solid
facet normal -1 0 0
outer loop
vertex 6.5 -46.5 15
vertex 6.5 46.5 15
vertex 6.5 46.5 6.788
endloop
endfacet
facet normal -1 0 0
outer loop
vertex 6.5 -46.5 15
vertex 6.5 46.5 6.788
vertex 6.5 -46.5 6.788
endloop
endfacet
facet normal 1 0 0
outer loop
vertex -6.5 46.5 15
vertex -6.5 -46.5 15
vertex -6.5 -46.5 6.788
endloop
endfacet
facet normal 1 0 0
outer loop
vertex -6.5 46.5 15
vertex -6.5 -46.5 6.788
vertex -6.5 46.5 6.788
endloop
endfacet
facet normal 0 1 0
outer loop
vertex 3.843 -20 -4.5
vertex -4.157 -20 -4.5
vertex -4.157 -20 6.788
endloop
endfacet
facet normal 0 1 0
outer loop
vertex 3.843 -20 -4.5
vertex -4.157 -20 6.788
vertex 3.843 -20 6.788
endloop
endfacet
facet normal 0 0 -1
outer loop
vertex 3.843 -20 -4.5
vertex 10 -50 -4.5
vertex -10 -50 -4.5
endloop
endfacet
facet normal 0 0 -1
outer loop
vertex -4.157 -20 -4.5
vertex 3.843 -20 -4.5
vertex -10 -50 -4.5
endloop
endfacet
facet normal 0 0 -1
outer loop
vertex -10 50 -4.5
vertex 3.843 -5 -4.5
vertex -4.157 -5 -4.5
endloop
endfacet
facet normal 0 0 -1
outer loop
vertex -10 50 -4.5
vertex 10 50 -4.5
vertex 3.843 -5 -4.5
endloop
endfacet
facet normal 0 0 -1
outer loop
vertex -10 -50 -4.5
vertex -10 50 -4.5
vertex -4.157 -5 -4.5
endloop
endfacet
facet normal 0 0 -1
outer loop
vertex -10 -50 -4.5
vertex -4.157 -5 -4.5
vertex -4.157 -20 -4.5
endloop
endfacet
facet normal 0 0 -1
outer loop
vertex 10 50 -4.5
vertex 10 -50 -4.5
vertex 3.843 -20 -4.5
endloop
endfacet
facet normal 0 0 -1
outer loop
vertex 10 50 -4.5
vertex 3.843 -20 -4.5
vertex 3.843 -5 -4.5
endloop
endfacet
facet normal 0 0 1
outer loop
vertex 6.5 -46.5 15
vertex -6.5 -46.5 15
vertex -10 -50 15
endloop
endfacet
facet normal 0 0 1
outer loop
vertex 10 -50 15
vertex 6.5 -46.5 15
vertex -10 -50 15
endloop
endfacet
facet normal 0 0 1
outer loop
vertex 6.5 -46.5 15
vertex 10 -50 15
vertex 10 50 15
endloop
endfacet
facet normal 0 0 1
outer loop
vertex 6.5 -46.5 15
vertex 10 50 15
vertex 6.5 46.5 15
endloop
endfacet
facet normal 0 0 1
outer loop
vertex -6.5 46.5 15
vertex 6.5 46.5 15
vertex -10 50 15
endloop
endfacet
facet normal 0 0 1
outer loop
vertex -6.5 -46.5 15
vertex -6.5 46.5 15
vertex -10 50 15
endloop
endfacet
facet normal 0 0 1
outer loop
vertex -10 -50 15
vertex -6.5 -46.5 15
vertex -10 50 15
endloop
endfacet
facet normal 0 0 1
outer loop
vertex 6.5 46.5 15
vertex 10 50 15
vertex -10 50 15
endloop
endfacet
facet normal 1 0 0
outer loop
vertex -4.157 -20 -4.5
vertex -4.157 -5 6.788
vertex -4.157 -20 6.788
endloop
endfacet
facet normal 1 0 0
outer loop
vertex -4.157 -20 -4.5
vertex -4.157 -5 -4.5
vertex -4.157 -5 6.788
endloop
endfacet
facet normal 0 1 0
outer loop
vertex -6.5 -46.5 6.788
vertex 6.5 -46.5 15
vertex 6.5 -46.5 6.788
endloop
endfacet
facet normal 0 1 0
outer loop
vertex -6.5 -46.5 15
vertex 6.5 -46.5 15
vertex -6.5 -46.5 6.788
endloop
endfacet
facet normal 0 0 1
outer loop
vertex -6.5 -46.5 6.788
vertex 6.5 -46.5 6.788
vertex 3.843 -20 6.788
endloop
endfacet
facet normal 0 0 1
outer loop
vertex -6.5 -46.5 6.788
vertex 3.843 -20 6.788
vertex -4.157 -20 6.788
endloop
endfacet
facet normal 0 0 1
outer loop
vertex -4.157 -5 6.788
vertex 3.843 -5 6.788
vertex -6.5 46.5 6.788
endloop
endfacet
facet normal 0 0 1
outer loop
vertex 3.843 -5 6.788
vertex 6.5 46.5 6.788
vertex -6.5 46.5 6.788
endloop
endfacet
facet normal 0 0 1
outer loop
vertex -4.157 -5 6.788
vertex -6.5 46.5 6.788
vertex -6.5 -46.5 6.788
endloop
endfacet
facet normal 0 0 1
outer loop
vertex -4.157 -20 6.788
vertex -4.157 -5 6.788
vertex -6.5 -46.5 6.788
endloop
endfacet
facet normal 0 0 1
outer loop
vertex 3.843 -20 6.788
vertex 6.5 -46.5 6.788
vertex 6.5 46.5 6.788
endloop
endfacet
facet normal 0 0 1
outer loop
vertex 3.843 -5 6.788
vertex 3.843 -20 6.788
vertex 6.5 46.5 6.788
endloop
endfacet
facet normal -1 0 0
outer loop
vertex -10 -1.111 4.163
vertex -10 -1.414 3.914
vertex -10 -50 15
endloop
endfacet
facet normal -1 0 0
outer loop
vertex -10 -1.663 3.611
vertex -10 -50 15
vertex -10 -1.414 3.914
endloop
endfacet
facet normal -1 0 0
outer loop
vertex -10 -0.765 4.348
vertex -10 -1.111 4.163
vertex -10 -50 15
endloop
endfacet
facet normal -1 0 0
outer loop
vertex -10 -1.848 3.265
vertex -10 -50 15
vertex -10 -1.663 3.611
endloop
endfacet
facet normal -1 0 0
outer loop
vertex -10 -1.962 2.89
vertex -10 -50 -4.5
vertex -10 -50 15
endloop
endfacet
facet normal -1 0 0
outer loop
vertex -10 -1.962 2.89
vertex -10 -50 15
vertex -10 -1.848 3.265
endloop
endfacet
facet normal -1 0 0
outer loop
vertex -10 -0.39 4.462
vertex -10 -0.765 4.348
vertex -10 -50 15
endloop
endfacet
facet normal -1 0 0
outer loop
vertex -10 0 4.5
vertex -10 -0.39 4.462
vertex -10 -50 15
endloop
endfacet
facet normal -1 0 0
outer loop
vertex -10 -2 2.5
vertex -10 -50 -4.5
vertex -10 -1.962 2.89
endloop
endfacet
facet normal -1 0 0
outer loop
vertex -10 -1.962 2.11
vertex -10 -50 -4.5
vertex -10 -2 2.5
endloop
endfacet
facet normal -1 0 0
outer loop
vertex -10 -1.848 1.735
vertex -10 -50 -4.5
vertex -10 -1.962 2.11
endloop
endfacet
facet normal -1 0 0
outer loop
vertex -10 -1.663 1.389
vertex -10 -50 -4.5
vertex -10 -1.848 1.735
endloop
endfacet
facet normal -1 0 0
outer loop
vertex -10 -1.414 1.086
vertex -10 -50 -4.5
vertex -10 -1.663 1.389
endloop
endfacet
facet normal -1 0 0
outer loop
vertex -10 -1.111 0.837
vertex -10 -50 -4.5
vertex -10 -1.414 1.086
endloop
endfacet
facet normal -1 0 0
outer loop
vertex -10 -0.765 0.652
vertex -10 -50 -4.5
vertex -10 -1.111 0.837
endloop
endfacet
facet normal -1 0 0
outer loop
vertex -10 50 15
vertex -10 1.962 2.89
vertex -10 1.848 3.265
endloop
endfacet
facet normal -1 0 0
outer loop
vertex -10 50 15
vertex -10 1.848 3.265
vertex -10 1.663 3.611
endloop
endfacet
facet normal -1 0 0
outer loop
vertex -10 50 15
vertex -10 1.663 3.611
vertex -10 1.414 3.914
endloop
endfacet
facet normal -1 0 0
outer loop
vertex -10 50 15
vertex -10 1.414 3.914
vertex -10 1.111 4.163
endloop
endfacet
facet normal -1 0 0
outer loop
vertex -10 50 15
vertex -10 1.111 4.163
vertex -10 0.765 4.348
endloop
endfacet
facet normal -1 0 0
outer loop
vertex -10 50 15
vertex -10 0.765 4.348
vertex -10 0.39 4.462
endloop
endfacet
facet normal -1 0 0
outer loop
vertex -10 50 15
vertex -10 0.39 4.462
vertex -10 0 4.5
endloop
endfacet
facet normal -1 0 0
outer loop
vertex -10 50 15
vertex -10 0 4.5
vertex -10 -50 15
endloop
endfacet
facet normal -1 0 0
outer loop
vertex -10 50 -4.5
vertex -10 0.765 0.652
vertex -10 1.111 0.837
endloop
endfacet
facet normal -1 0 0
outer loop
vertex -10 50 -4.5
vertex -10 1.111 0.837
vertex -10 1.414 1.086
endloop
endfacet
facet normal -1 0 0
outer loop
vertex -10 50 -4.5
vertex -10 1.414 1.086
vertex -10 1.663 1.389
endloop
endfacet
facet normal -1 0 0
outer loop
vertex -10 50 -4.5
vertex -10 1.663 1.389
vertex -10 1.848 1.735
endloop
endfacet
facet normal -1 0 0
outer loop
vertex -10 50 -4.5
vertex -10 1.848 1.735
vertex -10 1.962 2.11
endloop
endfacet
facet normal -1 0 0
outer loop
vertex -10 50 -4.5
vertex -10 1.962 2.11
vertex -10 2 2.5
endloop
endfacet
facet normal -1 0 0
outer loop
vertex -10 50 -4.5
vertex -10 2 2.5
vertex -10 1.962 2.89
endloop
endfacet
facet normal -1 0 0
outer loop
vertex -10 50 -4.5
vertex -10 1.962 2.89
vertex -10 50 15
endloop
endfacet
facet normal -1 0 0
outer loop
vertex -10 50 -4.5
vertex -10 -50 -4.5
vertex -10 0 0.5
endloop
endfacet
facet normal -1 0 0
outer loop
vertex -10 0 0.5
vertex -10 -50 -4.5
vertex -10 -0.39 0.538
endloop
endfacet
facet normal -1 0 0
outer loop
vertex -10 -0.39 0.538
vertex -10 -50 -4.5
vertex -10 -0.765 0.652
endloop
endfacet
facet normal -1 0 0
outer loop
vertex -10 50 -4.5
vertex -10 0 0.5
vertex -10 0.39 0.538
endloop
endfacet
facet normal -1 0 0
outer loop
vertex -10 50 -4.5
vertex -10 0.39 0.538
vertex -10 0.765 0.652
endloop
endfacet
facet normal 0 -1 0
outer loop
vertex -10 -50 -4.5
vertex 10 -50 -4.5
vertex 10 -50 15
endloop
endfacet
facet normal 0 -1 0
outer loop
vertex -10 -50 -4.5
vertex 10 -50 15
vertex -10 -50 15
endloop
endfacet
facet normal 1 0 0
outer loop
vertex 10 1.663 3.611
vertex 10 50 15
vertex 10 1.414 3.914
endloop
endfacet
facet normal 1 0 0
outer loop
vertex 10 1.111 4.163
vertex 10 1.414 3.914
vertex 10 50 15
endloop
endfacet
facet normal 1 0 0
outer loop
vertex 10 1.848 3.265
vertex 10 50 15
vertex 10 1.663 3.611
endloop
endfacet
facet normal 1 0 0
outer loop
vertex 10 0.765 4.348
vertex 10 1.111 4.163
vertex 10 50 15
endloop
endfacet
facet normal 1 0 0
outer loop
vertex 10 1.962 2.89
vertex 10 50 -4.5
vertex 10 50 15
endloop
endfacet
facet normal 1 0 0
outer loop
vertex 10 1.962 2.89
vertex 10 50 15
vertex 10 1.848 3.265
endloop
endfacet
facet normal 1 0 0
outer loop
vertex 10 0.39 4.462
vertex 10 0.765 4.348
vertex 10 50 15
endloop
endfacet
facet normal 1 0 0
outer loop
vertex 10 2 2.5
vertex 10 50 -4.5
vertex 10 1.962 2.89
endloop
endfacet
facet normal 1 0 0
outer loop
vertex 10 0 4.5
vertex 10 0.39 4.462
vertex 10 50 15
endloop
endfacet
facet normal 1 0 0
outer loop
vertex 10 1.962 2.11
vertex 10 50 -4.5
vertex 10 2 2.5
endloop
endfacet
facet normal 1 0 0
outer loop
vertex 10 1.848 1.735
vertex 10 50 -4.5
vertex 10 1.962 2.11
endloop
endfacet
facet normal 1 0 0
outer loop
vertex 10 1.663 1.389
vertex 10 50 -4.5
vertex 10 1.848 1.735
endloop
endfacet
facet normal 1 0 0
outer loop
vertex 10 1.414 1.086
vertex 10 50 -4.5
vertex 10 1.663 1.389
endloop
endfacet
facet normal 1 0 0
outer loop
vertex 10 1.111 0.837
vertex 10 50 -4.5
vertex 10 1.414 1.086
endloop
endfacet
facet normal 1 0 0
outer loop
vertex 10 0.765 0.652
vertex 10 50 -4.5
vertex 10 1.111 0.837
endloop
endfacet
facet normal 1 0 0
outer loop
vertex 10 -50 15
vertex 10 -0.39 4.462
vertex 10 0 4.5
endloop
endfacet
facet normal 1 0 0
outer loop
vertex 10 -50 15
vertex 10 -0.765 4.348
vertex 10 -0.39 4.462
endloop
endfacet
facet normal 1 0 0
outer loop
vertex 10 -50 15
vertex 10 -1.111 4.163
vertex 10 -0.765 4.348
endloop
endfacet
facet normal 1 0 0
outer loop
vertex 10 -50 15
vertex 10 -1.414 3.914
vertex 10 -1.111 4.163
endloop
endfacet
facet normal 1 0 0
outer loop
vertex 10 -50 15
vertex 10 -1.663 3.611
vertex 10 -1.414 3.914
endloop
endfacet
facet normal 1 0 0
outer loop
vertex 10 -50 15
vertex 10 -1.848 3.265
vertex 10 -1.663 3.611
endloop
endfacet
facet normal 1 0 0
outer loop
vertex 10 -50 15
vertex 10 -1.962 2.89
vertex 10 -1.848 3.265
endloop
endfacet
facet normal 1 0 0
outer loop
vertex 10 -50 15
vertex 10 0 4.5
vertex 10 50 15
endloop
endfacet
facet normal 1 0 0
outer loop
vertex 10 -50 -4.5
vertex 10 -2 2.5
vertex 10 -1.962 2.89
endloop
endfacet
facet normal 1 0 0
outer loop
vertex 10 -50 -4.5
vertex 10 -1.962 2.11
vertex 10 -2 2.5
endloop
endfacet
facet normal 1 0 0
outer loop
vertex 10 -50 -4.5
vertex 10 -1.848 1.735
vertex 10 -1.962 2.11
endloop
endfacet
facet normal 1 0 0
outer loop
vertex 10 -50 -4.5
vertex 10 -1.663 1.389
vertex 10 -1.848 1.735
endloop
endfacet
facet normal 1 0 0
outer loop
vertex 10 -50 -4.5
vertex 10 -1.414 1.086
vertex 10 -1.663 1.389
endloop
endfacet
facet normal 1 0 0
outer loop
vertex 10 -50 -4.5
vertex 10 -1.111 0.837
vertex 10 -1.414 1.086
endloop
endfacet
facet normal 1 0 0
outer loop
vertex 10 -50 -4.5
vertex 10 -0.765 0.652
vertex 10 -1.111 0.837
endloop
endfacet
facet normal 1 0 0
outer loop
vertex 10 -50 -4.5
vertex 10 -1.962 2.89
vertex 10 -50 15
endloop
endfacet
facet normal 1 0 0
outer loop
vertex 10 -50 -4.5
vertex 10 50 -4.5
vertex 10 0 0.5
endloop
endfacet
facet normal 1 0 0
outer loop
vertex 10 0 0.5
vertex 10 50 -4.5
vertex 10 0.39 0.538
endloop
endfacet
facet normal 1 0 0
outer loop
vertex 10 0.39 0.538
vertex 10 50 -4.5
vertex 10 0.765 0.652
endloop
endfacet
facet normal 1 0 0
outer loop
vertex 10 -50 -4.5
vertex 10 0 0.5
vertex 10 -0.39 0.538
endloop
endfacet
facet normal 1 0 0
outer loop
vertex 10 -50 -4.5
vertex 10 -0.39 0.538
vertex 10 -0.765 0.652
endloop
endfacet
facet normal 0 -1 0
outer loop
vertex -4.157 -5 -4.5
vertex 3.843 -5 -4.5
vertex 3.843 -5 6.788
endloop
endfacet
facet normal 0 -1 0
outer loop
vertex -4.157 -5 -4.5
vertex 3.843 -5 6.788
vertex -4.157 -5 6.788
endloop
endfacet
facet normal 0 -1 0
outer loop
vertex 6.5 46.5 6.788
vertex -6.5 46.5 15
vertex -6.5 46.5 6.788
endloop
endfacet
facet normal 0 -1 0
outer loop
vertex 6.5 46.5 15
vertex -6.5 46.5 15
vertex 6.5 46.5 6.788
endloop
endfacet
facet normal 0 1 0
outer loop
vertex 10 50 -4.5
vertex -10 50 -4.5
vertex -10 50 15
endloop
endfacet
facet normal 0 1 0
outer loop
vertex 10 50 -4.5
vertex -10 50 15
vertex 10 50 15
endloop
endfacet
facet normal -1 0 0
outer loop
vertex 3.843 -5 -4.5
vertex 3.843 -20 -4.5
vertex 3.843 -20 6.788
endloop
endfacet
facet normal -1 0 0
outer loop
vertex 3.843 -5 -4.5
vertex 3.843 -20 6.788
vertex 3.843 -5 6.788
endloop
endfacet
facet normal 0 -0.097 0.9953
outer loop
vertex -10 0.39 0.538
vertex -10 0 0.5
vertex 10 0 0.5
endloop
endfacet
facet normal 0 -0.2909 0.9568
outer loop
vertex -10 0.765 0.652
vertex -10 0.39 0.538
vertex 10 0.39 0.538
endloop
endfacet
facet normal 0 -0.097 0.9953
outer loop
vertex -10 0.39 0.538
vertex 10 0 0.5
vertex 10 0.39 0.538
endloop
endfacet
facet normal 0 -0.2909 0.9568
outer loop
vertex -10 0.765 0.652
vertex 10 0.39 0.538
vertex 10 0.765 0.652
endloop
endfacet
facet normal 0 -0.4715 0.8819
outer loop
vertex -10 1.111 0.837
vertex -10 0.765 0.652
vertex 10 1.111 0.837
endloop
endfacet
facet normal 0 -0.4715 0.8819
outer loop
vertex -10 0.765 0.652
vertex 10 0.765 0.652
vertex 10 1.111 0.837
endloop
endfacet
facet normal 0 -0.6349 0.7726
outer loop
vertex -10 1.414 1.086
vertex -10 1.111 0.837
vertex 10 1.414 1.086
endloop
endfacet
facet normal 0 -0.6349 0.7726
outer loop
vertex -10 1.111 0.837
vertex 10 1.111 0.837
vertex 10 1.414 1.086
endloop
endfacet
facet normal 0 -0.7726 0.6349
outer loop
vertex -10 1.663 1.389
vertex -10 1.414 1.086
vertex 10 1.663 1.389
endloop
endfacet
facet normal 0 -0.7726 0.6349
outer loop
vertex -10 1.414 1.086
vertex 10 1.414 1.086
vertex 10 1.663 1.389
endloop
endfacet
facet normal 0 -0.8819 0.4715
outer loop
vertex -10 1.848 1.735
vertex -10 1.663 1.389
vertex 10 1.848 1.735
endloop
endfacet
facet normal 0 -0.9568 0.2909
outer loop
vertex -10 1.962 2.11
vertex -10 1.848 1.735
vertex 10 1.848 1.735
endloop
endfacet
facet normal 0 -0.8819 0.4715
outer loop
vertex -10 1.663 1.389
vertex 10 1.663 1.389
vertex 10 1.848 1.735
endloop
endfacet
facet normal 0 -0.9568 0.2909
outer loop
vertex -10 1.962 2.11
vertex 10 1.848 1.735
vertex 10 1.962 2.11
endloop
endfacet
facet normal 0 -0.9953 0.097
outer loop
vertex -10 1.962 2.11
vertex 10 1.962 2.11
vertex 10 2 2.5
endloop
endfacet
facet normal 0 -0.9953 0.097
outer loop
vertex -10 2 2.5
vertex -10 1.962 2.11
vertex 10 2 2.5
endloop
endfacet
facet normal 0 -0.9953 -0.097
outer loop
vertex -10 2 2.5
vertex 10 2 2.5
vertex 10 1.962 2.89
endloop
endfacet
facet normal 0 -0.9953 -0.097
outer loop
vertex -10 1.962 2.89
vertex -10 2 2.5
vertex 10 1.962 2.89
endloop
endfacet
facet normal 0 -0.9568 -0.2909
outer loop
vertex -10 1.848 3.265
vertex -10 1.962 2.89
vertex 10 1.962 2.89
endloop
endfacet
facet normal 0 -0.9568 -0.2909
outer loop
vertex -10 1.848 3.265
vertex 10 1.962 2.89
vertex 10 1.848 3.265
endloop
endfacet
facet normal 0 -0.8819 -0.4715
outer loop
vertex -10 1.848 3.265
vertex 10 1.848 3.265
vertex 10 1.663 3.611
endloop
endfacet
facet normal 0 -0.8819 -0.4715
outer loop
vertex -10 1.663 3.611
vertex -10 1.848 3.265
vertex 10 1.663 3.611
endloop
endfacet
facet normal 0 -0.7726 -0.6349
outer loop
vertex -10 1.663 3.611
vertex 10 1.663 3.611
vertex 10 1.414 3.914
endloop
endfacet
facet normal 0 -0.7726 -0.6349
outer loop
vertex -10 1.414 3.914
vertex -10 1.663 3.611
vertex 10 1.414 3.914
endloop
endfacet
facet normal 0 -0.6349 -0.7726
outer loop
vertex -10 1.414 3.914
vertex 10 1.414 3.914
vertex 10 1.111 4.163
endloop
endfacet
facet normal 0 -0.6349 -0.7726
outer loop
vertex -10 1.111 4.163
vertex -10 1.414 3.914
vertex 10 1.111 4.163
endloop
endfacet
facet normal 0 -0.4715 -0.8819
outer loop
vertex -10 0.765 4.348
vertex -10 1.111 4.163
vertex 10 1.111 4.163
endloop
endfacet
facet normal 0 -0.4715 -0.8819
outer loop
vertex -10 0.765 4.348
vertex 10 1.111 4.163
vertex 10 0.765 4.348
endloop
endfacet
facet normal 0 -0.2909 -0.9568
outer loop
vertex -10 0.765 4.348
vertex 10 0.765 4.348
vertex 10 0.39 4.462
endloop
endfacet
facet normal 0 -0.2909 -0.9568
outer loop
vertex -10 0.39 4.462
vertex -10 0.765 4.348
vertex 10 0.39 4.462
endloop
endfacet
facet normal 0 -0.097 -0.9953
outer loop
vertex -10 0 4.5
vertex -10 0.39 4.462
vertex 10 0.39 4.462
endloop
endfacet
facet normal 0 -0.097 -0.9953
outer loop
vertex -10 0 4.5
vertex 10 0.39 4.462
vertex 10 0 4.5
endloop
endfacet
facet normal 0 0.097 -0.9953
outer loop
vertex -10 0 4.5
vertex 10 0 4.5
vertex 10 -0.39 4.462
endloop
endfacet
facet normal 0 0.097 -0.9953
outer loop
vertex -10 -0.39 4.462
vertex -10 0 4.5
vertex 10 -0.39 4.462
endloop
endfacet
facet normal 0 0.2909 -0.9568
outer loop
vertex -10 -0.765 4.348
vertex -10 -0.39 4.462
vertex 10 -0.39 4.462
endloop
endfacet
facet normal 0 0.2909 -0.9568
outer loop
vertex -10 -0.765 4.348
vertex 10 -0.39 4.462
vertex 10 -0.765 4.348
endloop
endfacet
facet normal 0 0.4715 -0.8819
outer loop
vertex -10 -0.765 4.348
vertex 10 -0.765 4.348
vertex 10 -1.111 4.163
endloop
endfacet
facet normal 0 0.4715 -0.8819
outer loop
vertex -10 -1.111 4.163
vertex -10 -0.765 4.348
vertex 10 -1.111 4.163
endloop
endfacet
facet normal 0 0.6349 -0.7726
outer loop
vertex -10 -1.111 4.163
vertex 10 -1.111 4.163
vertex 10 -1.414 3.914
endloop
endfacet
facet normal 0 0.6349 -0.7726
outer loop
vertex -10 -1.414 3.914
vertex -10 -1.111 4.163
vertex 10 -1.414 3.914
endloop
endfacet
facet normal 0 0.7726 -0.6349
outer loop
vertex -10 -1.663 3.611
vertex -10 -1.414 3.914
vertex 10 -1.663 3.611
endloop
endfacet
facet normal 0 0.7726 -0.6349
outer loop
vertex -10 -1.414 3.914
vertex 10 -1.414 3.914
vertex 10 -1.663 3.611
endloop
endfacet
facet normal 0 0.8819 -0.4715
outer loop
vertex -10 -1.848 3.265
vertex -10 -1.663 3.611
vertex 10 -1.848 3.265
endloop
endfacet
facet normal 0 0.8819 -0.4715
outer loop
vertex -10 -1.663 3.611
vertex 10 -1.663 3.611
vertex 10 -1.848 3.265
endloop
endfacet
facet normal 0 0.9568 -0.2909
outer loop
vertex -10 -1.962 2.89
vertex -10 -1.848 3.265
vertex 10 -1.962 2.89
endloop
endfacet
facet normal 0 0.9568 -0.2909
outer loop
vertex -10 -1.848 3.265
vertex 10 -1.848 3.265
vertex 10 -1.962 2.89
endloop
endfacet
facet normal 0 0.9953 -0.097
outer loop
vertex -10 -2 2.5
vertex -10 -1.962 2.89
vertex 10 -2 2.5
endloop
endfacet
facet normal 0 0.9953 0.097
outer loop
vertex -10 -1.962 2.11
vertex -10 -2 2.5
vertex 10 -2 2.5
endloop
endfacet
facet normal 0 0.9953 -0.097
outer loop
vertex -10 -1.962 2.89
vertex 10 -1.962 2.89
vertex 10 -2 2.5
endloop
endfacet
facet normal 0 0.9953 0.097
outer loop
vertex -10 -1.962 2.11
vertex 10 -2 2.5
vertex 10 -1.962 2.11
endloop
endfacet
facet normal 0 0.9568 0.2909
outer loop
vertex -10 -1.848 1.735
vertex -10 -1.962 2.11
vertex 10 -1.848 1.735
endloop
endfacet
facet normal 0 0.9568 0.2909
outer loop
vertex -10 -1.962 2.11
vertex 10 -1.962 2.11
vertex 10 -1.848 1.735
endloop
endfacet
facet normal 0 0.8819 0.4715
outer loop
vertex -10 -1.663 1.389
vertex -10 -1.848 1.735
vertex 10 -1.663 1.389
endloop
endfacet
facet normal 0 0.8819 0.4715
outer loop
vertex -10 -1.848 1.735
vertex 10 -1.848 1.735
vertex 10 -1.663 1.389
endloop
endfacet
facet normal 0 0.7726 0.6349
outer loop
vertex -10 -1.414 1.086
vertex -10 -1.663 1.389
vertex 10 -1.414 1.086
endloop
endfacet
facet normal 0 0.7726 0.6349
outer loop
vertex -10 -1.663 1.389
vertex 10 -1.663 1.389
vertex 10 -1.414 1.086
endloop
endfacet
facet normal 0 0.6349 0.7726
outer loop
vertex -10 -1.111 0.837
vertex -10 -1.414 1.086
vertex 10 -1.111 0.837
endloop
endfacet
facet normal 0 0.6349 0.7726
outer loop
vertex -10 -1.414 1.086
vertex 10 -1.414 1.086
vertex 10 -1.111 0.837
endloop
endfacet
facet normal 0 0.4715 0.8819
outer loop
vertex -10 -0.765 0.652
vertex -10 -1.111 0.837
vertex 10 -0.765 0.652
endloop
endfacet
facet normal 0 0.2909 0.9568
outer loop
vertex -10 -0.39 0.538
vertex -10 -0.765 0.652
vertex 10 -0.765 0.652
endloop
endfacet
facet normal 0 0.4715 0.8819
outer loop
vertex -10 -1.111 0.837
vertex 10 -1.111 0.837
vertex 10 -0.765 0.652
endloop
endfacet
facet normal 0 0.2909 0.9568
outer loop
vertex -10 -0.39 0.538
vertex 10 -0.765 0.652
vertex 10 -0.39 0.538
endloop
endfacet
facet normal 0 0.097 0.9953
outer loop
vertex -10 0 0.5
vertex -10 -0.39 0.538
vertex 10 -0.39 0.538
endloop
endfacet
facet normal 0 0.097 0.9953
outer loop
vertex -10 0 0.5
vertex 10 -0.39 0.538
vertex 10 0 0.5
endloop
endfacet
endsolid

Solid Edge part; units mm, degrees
sketch "Sketch1" plane through (0, 0, 0) normal (0, 0, 1) x (1, 0, 0)
  line L0 (10, -50) -> (-10, -50)
  line L1 (-10, -50) -> (-10, 50)
  line L2 (-10, 50) -> (10, 50)
  line L3 (10, 50) -> (10, -50)
  dimension "D1" = 20
  dimension "D2" = 100
extrude "Ajout_matière_1" add sketch "Sketch1" along normal blind 15
sketch "Sketch2" plane through (0, 0, 15) normal (0, 0, 1) x (1, 0, 0)
  line L0 (6.4998, -46.5) -> (-6.4998, -46.5)
  line L1 (-6.4998, -46.5) -> (-6.4998, 46.5)
  line L2 (-6.4998, 46.5) -> (6.4998, 46.5)
  line L3 (6.4998, 46.5) -> (6.4998, -46.5)
  dimension "D1" = 3.5002
  dimension "D2" = 3.5002
  dimension "D3" = 3.5
extrude "Enlèvement_matière_1" cut sketch "Sketch2" against normal blind 8.2123
sketch "Sketch3" plane through (10, 0, 7.5) normal (1, 0, 0) x (0, 0, -1)
  circle A0 centre (5, 0) radius 2
  dimension "D1" = 2.5
extrude "Cutout1" cut sketch "Sketch3" against normal through all
sketch "Sketch4" plane through (0, 0, 0) normal (0, 0, -1) x (1, 0, 0)
  line L0 (-10, -50) -> (10, -50)
  line L1 (10, -50) -> (10, 50)
  line L2 (10, 50) -> (-10, 50)
  line L3 (-10, 50) -> (-10, -50)
extrude "Ajout_matière_2" add sketch "Sketch4" along normal blind 4.5
sketch "Sketch5" plane through (0, 0, -4.5) normal (0, 0, -1) x (0, -1, 0)
  line L0 (20, -3.843) -> (5, -3.843)
  line L1 (5, -3.843) -> (5, 4.157)
  line L2 (5, 4.157) -> (20, 4.157)
  line L3 (20, 4.157) -> (20, -3.843)
  dimension "D1" = 15
  dimension "D2" = 8
  dimension "D3" = 5
extrude "Cutout2" cut sketch "Sketch5" against normal through all
properties material "Acier S235"
